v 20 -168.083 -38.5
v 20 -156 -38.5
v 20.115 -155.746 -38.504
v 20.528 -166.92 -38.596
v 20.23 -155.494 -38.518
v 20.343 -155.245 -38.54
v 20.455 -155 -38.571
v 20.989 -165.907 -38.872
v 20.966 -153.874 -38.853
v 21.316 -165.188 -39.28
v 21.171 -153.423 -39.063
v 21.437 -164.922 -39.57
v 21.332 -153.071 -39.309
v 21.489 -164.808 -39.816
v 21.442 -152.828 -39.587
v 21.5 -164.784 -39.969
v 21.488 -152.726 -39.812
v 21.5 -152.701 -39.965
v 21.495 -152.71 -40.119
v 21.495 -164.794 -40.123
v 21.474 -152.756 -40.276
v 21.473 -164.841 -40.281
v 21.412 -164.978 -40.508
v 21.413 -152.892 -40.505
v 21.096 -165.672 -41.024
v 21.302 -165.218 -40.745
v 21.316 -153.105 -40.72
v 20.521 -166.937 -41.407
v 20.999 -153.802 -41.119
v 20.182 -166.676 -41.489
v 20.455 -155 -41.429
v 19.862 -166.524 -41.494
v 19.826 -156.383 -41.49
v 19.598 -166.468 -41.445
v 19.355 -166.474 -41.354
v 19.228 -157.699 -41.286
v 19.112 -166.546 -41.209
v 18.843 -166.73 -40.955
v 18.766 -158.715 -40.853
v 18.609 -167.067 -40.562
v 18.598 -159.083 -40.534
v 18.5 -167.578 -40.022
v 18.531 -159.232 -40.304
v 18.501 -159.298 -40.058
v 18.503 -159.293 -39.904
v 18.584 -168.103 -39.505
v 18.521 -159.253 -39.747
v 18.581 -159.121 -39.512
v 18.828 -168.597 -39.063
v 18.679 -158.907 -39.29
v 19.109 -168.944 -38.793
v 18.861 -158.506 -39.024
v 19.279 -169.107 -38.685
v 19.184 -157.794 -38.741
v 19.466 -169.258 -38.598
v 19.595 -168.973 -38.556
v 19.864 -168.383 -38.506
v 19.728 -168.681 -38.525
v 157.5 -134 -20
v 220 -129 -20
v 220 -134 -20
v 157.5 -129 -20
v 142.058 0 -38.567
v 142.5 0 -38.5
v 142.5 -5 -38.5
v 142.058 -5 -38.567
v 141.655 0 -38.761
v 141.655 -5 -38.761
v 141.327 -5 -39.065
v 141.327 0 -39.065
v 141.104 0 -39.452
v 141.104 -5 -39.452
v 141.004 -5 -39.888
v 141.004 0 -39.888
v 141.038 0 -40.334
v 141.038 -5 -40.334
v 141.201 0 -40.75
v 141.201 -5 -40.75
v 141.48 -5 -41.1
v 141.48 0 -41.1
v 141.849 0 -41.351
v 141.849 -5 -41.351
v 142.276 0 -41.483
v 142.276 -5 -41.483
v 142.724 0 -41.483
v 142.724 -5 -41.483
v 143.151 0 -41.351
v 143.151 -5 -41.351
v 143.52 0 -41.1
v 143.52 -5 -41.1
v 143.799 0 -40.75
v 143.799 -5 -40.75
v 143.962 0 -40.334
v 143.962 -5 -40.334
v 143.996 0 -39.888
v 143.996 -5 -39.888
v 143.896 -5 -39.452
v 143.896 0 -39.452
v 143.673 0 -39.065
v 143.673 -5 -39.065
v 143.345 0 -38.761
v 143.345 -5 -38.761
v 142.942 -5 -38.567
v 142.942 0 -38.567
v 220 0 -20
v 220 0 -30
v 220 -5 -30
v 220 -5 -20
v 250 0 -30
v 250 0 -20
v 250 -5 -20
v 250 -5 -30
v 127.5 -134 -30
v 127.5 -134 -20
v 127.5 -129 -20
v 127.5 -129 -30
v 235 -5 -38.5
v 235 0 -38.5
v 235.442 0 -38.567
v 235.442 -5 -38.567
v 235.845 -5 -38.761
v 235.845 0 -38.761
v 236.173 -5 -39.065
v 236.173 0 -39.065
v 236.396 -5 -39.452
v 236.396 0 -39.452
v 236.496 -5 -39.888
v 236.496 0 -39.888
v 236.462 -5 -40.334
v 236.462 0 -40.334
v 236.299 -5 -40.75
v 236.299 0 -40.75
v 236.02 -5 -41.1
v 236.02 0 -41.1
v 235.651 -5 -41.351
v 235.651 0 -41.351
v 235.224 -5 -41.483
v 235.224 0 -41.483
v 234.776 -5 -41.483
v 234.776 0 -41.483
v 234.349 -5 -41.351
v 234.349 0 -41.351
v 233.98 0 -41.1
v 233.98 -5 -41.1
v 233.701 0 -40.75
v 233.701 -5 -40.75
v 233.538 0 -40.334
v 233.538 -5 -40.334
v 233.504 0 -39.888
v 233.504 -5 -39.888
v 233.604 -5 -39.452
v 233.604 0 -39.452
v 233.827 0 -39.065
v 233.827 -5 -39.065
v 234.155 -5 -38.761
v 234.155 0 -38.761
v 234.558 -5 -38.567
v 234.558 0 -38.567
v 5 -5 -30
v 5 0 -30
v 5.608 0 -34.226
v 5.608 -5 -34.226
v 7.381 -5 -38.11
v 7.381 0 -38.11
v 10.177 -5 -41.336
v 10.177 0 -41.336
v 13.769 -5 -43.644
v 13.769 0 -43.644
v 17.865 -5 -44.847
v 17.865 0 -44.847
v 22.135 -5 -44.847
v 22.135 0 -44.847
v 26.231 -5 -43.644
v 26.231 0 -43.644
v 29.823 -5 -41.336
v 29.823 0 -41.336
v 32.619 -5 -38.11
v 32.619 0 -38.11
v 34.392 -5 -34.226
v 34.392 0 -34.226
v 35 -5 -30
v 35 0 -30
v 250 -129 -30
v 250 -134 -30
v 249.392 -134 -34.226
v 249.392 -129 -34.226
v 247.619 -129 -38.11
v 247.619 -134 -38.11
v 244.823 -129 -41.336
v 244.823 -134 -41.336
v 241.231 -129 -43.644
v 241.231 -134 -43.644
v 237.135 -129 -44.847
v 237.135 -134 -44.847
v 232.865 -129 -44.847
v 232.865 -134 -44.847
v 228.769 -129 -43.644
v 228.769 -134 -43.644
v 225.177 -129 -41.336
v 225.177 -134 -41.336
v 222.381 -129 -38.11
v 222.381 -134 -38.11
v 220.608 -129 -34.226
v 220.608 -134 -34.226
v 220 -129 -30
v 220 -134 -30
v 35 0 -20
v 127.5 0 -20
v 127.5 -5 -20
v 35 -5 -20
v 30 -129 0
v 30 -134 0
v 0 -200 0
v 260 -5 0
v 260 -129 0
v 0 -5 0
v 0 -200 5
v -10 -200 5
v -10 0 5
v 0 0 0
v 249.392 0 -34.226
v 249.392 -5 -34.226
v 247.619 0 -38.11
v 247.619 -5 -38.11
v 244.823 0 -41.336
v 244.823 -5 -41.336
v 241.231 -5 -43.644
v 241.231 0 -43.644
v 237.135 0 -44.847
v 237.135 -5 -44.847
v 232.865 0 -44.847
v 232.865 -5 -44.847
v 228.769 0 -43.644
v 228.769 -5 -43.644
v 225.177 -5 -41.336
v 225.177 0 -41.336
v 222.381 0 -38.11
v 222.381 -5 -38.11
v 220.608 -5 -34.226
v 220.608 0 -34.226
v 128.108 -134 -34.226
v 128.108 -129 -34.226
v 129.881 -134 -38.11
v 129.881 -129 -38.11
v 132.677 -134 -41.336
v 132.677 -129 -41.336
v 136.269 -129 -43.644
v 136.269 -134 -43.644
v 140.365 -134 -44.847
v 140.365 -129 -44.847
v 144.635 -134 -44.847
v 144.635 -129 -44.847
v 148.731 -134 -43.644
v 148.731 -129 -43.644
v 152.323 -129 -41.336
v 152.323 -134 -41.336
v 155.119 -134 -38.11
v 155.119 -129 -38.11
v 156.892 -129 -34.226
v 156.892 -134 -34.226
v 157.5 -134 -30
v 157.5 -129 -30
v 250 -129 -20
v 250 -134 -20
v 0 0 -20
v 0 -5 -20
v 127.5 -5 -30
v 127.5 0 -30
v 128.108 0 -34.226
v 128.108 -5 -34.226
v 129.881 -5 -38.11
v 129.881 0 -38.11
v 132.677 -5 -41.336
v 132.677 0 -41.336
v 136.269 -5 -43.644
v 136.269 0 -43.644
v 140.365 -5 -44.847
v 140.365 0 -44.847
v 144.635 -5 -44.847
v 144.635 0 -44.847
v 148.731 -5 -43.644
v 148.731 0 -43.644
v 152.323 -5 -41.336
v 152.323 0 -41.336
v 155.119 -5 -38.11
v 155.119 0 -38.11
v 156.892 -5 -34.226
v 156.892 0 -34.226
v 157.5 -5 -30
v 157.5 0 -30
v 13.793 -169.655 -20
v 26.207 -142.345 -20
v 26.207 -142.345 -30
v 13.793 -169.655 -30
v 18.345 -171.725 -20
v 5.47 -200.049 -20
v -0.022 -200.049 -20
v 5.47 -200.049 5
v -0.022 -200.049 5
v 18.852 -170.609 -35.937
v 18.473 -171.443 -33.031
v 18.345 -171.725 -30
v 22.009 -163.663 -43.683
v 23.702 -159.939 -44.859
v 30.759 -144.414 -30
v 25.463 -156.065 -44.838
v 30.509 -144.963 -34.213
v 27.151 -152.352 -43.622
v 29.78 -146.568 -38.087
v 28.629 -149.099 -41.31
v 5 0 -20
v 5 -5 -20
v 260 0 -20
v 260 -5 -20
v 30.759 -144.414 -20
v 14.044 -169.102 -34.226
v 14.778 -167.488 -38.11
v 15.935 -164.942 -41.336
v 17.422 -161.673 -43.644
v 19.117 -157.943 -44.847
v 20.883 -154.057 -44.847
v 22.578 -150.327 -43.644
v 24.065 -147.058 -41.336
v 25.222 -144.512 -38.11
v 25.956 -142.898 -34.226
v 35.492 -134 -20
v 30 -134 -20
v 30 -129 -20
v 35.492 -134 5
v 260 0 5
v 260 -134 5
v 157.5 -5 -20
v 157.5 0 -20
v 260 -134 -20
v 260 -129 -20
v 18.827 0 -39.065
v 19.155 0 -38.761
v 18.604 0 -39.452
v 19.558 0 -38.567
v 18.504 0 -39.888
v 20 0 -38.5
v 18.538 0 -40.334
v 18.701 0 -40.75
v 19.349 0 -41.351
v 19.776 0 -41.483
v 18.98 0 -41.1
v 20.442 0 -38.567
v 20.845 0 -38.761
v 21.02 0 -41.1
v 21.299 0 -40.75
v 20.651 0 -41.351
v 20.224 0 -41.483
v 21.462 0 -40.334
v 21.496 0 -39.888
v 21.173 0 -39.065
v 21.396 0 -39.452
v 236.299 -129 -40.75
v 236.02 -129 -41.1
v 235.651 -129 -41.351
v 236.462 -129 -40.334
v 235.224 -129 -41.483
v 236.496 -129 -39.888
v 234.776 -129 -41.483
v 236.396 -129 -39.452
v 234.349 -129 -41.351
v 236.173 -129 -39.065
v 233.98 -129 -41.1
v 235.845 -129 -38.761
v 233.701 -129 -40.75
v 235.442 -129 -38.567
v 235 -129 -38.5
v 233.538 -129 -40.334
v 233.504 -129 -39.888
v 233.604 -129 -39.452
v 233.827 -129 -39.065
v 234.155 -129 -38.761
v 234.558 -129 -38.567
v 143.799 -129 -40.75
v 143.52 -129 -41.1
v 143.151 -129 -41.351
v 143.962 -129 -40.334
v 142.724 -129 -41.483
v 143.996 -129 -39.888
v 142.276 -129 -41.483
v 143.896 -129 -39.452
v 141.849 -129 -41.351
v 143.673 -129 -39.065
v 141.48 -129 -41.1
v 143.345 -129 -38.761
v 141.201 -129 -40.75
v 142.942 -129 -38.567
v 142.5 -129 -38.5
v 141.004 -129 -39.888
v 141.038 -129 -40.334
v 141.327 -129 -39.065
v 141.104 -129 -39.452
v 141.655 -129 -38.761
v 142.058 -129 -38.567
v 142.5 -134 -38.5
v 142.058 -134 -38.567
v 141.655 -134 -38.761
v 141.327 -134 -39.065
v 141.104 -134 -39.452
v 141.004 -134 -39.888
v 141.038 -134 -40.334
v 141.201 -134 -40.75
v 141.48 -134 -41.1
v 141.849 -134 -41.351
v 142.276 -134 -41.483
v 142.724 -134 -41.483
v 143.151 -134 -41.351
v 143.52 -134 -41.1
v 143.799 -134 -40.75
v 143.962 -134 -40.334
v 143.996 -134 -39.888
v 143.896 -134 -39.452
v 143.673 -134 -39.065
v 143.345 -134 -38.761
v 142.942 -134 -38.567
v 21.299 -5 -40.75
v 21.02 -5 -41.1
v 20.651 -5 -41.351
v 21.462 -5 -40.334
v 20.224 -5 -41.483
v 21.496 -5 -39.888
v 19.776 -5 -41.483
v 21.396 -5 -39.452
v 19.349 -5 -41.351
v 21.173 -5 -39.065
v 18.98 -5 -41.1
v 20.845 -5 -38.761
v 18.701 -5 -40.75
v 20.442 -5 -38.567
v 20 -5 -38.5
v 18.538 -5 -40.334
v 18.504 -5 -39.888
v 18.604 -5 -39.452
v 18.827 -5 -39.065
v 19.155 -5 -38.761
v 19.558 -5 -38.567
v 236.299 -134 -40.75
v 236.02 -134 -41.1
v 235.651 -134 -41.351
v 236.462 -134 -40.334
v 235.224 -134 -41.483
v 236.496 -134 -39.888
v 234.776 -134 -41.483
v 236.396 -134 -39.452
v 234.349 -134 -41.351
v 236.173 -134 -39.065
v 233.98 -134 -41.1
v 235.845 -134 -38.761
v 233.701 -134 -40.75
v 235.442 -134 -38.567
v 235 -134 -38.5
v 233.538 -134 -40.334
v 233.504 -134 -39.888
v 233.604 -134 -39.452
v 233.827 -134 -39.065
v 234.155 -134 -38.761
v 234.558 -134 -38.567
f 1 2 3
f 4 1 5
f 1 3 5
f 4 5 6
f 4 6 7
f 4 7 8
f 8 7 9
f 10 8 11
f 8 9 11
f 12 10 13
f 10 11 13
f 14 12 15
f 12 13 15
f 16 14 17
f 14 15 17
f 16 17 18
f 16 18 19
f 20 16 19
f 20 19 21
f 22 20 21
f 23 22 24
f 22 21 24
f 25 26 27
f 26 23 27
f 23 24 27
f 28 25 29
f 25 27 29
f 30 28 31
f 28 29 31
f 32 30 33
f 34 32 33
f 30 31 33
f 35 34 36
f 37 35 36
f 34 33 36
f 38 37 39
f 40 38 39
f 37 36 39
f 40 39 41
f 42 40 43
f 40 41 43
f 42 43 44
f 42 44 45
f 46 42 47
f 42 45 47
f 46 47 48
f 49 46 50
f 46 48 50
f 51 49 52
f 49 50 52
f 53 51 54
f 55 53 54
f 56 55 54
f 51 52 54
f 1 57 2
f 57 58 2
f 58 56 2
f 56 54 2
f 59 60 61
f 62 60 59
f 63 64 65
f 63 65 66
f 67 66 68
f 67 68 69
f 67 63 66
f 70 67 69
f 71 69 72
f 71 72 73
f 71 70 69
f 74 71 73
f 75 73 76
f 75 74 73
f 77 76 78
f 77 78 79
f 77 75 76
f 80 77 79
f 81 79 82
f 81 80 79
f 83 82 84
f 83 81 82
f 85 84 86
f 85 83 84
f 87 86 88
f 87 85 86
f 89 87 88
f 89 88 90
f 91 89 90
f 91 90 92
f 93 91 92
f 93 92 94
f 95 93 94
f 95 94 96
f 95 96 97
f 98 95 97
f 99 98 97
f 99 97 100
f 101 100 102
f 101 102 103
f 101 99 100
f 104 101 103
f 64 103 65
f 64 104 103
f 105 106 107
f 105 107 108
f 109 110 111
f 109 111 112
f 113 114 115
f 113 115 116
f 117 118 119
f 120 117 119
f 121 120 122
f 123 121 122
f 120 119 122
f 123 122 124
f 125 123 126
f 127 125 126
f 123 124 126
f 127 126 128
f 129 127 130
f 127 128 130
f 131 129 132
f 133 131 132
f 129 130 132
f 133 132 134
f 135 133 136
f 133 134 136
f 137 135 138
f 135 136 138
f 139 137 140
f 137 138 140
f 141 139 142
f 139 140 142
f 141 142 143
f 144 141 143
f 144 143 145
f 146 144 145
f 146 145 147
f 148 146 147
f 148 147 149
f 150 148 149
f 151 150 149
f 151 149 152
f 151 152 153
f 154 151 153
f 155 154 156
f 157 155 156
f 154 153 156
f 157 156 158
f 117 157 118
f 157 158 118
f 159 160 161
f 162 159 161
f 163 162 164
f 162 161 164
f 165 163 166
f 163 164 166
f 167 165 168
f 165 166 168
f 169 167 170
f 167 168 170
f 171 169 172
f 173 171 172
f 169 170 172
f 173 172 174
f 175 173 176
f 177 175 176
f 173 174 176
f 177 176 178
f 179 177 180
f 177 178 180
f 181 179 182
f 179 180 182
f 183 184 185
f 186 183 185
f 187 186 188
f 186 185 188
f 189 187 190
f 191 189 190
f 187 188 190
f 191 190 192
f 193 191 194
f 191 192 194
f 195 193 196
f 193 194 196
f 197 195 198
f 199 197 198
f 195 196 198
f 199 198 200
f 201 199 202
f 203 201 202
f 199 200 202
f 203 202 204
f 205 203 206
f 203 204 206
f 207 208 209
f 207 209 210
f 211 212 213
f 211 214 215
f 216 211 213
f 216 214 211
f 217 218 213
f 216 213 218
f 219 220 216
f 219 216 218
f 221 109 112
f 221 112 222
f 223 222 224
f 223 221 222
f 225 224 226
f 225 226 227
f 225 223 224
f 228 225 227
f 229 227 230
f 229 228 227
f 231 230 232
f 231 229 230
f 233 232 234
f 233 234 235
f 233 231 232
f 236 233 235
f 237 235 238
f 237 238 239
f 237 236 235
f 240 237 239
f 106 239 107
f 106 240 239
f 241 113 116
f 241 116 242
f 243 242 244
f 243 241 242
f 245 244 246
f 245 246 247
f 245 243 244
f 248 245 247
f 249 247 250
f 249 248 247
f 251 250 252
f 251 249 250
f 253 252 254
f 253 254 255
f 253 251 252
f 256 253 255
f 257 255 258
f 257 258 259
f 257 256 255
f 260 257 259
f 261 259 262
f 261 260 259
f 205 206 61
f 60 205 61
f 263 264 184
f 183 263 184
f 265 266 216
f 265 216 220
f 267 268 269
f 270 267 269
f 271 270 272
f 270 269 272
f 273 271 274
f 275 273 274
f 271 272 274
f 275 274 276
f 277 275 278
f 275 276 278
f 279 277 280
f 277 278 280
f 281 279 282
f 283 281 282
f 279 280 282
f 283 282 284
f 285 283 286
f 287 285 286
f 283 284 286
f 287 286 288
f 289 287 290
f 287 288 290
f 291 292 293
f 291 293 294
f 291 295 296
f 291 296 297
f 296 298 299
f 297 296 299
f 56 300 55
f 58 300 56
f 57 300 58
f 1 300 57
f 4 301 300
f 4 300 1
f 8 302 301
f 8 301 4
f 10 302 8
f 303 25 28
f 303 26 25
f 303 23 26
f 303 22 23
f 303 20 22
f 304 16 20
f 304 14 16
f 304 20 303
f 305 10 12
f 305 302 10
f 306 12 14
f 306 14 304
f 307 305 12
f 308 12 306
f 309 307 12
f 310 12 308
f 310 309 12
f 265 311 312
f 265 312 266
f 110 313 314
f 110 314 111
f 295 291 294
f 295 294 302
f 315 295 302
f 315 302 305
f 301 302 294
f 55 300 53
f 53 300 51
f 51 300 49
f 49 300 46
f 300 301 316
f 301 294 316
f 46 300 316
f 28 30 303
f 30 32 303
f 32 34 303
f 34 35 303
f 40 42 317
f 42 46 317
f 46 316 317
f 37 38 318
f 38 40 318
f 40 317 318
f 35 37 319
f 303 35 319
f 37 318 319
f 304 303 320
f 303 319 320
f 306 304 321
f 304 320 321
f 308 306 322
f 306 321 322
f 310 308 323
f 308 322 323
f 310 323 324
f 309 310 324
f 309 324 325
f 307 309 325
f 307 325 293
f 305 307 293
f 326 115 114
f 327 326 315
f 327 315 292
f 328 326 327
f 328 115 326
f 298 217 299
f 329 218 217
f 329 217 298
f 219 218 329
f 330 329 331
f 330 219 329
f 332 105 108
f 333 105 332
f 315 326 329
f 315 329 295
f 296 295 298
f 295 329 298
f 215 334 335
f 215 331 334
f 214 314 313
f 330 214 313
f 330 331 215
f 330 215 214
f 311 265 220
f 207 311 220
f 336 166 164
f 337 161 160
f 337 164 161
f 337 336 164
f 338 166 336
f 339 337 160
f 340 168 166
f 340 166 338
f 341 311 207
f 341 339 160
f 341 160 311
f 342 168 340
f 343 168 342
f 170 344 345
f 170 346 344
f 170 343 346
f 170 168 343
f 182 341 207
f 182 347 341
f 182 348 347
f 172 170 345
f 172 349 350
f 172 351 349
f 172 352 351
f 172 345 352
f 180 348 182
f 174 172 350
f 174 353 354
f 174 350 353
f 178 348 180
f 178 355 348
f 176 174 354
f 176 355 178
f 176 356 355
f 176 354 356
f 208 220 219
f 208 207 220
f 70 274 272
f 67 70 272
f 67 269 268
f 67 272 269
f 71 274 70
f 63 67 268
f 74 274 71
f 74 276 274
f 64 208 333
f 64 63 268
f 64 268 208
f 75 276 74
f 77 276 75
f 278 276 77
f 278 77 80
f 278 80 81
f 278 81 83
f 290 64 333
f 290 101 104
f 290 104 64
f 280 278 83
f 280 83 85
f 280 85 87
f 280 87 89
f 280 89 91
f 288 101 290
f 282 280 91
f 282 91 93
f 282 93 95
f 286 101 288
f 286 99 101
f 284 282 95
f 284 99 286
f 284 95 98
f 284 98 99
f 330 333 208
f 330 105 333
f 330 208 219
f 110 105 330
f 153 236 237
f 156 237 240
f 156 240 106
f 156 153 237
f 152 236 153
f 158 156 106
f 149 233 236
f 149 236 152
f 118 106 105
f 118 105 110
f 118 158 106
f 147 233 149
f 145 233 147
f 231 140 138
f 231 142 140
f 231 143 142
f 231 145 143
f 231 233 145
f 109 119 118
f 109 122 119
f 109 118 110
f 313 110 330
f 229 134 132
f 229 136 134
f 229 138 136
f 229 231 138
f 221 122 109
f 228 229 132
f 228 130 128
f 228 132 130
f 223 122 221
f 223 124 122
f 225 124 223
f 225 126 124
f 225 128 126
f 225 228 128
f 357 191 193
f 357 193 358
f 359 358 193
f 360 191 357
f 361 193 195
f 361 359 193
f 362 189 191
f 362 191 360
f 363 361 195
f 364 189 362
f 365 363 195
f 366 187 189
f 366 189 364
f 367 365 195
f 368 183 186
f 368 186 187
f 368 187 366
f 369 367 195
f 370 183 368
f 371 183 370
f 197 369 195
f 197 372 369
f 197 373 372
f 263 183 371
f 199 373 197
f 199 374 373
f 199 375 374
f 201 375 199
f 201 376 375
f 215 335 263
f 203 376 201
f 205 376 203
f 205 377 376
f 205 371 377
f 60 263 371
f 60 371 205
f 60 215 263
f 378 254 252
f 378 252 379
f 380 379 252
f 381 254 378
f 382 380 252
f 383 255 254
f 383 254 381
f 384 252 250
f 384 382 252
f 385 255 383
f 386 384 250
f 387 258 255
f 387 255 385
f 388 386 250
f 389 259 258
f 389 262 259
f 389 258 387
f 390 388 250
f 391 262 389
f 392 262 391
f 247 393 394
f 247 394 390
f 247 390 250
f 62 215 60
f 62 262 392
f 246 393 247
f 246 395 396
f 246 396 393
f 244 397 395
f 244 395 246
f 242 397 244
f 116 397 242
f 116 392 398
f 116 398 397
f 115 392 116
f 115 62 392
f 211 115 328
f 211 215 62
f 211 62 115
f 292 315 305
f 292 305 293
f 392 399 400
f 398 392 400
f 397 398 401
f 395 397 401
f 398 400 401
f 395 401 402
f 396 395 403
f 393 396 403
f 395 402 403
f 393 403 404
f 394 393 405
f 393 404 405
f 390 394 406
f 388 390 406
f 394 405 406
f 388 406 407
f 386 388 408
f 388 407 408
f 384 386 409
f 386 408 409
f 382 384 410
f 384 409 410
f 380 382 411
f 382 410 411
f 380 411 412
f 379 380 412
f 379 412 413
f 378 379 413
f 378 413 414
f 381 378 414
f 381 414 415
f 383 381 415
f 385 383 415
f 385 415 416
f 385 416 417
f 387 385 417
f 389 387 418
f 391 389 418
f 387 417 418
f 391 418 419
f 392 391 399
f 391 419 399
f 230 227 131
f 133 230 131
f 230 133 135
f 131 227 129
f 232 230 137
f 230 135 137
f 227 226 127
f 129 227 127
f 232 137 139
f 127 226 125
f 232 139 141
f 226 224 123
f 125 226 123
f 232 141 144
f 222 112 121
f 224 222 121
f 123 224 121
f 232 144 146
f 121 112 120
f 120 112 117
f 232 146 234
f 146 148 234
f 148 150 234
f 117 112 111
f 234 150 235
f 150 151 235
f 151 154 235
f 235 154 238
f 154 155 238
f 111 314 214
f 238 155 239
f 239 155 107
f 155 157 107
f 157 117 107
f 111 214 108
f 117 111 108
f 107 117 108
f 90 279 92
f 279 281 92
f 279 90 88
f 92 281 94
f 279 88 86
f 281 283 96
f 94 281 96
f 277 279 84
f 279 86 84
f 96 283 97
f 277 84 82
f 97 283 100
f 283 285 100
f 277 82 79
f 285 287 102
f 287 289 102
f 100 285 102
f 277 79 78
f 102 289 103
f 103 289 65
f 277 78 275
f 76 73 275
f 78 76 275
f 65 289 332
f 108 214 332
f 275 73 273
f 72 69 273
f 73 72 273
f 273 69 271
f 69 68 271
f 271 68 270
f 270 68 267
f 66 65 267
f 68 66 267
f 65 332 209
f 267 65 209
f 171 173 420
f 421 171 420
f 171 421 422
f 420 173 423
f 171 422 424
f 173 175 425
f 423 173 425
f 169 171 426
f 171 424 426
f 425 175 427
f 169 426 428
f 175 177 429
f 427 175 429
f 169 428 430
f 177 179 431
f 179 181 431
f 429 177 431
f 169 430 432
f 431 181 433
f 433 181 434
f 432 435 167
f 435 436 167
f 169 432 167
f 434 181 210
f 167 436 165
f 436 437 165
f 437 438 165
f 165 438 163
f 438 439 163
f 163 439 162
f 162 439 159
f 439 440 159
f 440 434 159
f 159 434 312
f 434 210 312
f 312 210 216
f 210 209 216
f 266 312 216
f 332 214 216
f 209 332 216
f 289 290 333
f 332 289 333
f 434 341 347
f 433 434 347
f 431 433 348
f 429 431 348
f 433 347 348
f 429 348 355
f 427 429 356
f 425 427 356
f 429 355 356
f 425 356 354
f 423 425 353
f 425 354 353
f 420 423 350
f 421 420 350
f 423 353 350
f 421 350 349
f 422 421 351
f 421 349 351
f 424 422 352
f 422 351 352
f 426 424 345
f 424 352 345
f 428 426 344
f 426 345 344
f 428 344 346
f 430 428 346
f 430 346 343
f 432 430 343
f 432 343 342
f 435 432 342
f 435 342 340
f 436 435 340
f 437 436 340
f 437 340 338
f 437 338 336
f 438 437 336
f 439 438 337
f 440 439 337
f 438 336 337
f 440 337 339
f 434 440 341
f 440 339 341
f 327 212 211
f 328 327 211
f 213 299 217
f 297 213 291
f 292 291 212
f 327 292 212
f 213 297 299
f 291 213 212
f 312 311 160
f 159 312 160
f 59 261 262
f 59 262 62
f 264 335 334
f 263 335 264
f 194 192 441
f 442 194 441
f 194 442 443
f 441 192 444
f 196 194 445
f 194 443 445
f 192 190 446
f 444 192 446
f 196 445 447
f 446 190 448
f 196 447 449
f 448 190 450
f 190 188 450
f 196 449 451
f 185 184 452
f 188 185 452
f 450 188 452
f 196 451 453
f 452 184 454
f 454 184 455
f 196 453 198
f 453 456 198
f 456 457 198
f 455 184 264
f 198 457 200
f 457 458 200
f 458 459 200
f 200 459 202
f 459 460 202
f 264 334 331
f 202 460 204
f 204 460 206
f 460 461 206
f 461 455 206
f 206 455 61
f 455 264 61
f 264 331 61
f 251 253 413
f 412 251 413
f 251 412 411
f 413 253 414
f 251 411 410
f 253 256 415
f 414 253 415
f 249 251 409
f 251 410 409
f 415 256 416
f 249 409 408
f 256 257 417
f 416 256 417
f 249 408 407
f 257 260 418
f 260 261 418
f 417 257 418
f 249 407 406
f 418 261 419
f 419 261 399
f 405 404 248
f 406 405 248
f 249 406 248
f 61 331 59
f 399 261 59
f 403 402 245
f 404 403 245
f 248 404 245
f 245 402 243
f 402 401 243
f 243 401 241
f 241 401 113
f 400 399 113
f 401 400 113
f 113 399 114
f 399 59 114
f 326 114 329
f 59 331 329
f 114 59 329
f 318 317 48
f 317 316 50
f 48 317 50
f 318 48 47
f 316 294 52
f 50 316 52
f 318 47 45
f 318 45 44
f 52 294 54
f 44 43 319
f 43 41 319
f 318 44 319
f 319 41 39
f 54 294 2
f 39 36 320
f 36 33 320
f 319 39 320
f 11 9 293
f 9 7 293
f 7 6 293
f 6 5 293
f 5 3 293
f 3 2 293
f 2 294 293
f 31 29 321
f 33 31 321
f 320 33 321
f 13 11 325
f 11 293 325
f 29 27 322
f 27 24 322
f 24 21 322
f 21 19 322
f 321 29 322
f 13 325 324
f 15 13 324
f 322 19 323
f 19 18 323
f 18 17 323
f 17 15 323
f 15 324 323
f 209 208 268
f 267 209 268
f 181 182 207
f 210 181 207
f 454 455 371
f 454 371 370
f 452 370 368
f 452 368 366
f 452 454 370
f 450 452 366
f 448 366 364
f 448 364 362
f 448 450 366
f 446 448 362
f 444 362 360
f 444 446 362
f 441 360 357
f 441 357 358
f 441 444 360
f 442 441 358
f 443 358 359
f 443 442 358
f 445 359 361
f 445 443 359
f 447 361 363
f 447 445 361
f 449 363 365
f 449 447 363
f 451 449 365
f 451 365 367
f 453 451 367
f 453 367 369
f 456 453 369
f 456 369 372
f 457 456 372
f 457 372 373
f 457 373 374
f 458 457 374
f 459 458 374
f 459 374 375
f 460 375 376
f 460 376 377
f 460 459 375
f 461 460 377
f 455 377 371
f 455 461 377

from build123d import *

# Parameters (mm, degrees)
SKETCH1_W                                  = 260
SKETCH1_H                                  = 134
BOSS_EXTRUDE1_DEPTH                        = 5
SKETCH2_W                                  = 260
SKETCH2_H                                  = 5
BOSS_EXTRUDE2_DEPTH                        = 20
SKETCH4_W                                  = 230
SKETCH4_H                                  = 5
BOSS_EXTRUDE3_DEPTH                        = 20
BOSS_EXTRUDE4_DEPTH                        = 5
SKETCH7_R                                  = 1.5
CUT_EXTRUDE1_DEPTH                         = 5
BOSS_EXTRUDE5_DEPTH                        = 5
BOSS_EXTRUDE9_DEPTH                        = 25
BOSS_EXTRUDE10_DEPTH                       = 200
BOSS_EXTRUDE11_DEPTH                       = 5
SKETCH14_R                                 = 1.5
CUT_EXTRUDE2_DEPTH                         = 5
BOSS_EXTRUDE12_DEPTH                       = 10
BOSS_EXTRUDE13_DEPTH                       = 5
SKETCH19_R                                 = 1.5
CUT_EXTRUDE4_DEPTH                         = 307.022874962
CUT_EXTRUDE4_DEPTH_BACK                    = 307.022874962
MIRROR4_AT_THE_SECOND_PLANE_COPY_1_DEPTH   = 5
MIRROR4_AT_THE_SECOND_PLANE_COPY_2_SKETC_R = 1.5
MIRROR4_AT_THE_SECOND_PLANE_COPY_2_DEPTH   = 5


with BuildPart() as part:
    # Sketch1 → Boss-Extrude1 (new body)
    with BuildSketch(Plane.XY):
        with Locations((130, -67)):
            Rectangle(SKETCH1_W, SKETCH1_H)
    extrude(amount=BOSS_EXTRUDE1_DEPTH)

    # Sketch2 → Boss-Extrude2 (add)
    with BuildSketch(Plane(origin=(0, 0, 0), x_dir=(-1, 0, 0), z_dir=(0, 0, -1))):
        with Locations((-130, -2.5)):
            Rectangle(SKETCH2_W, SKETCH2_H)
    extrude(amount=BOSS_EXTRUDE2_DEPTH)

    # Sketch4 → Boss-Extrude3 (add)
    with BuildSketch(Plane(origin=(0, 0, 0), x_dir=(-1, 0, 0), z_dir=(0, 0, -1))):
        with Locations((-145, -131.5)):
            Rectangle(SKETCH4_W, SKETCH4_H)
    extrude(amount=BOSS_EXTRUDE3_DEPTH)

    # Sketch6 → Boss-Extrude4 (add)
    with BuildSketch(Plane(origin=(0, 0, 0), x_dir=(1, 0, 0), z_dir=(0, 1, 0))):
        with BuildLine():
            Line((5, 20), (5, 30))
            ThreePointArc((5, 30), (20, 45), (35, 30))
            Line((35, 30), (35, 20))
            Line((35, 20), (5, 20))
        make_face()
    extrude(amount=-BOSS_EXTRUDE4_DEPTH)

    # Sketch7 → Cut-Extrude1 (cut)
    with BuildSketch(Plane(origin=(0, 0, 0), x_dir=(1, 0, 0), z_dir=(0, 1, 0))):
        with Locations(Location((20, 40, 0), (0, 0, 270))):
            Circle(SKETCH7_R)
    extrude(amount=-CUT_EXTRUDE1_DEPTH, mode=Mode.SUBTRACT)

    # Sketch8 → Boss-Extrude5 (add)
    with BuildSketch(Plane(origin=(0, 0, 0), x_dir=(-1, 0, 0), z_dir=(0, 0, -1))):
        Polygon((-30, -134), (0, -200), (0, -134), align=None)
    extrude(amount=-BOSS_EXTRUDE5_DEPTH)

    # Sketch10 → Boss-Extrude9 (add)
    with BuildSketch(Plane.XY.offset(5)):
        Polygon((30, -134), (35.492293624, -134), (5.469823482, -200.049434314), (-0.022470143, -200.049434314), align=None)
    extrude(amount=-BOSS_EXTRUDE9_DEPTH)

    # Sketch11 → Boss-Extrude10 (add)
    with BuildSketch(Plane(origin=(0, 0, 0), x_dir=(1, 0, 0), z_dir=(0, 1, 0))):
        Polygon((0, 0), (-10, -5), (0, -5), align=None)
    extrude(amount=-BOSS_EXTRUDE10_DEPTH)

    # Sketch13 → Boss-Extrude11 (add)
    with BuildSketch(Plane(origin=(0, 0, 0), x_dir=(1, 0, 0), z_dir=(0, 1, 0))):
        with BuildLine():
            Line((220, 30), (220, 20))
            Line((220, 20), (250, 20))
            Line((250, 20), (250, 29.999997567))
            ThreePointArc((250, 29.999997567), (235.000001217, 44.999997567), (220, 30))
        make_face()
    boss_extrude11 = extrude(amount=-BOSS_EXTRUDE11_DEPTH)

    # Sketch14 → Cut-Extrude2 (cut)
    with BuildSketch(Plane(origin=(0, 0, 0), x_dir=(1, 0, 0), z_dir=(0, 1, 0))):
        with Locations(Location((235, 39.999997567, 0), (0, 0, 270))):
            Circle(SKETCH14_R)
    cut_extrude2 = extrude(amount=-CUT_EXTRUDE2_DEPTH, mode=Mode.SUBTRACT)

    # Sketch15 → Boss-Extrude12 (add)
    with BuildSketch(Plane(origin=(0, 0, -20), x_dir=(-1, 0, 0), z_dir=(0, 0, -1))):
        Polygon((-30.758876552, -144.41351756), (-26.207044165, -142.344502838), (-13.792955835, -169.655497162), (-18.344788223, -171.724511883), align=None)
    extrude(amount=BOSS_EXTRUDE12_DEPTH)

    # Sketch17 → Boss-Extrude13 (add)
    with BuildSketch(Plane(origin=(75.342465753, -34.246575342, 0), x_dir=(0, 0, 1), z_dir=(-0.9103664774626048, 0.41380294430118403, 0))):
        with BuildLine():
            Line((-30, -118.741111598), (-30, -148.741111598))
            ThreePointArc((-30, -148.741111598), (-45, -133.741111598), (-30, -118.741111598))
        make_face()
    extrude(amount=-BOSS_EXTRUDE13_DEPTH)

    # Sketch19 → Cut-Extrude4 (cut, two sides)
    with BuildSketch(Plane(origin=(0, -155, 0), x_dir=(1, 0, 0), z_dir=(0, 1, 0))) as cut_extrude4_sk:
        with Locations(Location((20, 40, 0), (0, 0, 270))):
            Circle(SKETCH19_R)
    extrude(amount=CUT_EXTRUDE4_DEPTH, mode=Mode.SUBTRACT)
    extrude(cut_extrude4_sk.sketch, amount=-CUT_EXTRUDE4_DEPTH_BACK, mode=Mode.SUBTRACT)

    # Mirror4: Boss-Extrude11, Cut-Extrude2 across plane
    add(boss_extrude11.mirror(Plane.ZX.offset(-67)))
    add(cut_extrude2.mirror(Plane.ZX.offset(-67)), mode=Mode.SUBTRACT)

    # Mirror4 at the second plane: Boss-Extrude11, Cut-Extrude2 across plane
    add(boss_extrude11.mirror(Plane.ZY.offset(-188.75)))
    add(cut_extrude2.mirror(Plane.ZY.offset(-188.75)), mode=Mode.SUBTRACT)

    # Mirror4 at the second plane copy 1 sketc → Mirror4 at the second plane copy 1 (add)
    with BuildSketch(Plane(origin=(377.5, -134, 0), x_dir=(-1, 0, 0), z_dir=(0, -1, 0))):
        with BuildLine():
            Line((220, 30), (220, 20))
            Line((220, 20), (250, 20))
            Line((250, 20), (250, 29.999997567))
            ThreePointArc((250, 29.999997567), (235.000001217, 44.999997567), (220, 30))
        make_face()
    extrude(amount=-MIRROR4_AT_THE_SECOND_PLANE_COPY_1_DEPTH)

    # Mirror4 at the second plane copy 2 sketc → Mirror4 at the second plane copy 2 (cut)
    with BuildSketch(Plane(origin=(377.5, -134, 0), x_dir=(-1, 0, 0), z_dir=(0, -1, 0))):
        with Locations(Location((235, 39.999997567, 0), (0, 0, 270))):
            Circle(MIRROR4_AT_THE_SECOND_PLANE_COPY_2_SKETC_R)
    extrude(amount=-MIRROR4_AT_THE_SECOND_PLANE_COPY_2_DEPTH, mode=Mode.SUBTRACT)


solid = part.part
